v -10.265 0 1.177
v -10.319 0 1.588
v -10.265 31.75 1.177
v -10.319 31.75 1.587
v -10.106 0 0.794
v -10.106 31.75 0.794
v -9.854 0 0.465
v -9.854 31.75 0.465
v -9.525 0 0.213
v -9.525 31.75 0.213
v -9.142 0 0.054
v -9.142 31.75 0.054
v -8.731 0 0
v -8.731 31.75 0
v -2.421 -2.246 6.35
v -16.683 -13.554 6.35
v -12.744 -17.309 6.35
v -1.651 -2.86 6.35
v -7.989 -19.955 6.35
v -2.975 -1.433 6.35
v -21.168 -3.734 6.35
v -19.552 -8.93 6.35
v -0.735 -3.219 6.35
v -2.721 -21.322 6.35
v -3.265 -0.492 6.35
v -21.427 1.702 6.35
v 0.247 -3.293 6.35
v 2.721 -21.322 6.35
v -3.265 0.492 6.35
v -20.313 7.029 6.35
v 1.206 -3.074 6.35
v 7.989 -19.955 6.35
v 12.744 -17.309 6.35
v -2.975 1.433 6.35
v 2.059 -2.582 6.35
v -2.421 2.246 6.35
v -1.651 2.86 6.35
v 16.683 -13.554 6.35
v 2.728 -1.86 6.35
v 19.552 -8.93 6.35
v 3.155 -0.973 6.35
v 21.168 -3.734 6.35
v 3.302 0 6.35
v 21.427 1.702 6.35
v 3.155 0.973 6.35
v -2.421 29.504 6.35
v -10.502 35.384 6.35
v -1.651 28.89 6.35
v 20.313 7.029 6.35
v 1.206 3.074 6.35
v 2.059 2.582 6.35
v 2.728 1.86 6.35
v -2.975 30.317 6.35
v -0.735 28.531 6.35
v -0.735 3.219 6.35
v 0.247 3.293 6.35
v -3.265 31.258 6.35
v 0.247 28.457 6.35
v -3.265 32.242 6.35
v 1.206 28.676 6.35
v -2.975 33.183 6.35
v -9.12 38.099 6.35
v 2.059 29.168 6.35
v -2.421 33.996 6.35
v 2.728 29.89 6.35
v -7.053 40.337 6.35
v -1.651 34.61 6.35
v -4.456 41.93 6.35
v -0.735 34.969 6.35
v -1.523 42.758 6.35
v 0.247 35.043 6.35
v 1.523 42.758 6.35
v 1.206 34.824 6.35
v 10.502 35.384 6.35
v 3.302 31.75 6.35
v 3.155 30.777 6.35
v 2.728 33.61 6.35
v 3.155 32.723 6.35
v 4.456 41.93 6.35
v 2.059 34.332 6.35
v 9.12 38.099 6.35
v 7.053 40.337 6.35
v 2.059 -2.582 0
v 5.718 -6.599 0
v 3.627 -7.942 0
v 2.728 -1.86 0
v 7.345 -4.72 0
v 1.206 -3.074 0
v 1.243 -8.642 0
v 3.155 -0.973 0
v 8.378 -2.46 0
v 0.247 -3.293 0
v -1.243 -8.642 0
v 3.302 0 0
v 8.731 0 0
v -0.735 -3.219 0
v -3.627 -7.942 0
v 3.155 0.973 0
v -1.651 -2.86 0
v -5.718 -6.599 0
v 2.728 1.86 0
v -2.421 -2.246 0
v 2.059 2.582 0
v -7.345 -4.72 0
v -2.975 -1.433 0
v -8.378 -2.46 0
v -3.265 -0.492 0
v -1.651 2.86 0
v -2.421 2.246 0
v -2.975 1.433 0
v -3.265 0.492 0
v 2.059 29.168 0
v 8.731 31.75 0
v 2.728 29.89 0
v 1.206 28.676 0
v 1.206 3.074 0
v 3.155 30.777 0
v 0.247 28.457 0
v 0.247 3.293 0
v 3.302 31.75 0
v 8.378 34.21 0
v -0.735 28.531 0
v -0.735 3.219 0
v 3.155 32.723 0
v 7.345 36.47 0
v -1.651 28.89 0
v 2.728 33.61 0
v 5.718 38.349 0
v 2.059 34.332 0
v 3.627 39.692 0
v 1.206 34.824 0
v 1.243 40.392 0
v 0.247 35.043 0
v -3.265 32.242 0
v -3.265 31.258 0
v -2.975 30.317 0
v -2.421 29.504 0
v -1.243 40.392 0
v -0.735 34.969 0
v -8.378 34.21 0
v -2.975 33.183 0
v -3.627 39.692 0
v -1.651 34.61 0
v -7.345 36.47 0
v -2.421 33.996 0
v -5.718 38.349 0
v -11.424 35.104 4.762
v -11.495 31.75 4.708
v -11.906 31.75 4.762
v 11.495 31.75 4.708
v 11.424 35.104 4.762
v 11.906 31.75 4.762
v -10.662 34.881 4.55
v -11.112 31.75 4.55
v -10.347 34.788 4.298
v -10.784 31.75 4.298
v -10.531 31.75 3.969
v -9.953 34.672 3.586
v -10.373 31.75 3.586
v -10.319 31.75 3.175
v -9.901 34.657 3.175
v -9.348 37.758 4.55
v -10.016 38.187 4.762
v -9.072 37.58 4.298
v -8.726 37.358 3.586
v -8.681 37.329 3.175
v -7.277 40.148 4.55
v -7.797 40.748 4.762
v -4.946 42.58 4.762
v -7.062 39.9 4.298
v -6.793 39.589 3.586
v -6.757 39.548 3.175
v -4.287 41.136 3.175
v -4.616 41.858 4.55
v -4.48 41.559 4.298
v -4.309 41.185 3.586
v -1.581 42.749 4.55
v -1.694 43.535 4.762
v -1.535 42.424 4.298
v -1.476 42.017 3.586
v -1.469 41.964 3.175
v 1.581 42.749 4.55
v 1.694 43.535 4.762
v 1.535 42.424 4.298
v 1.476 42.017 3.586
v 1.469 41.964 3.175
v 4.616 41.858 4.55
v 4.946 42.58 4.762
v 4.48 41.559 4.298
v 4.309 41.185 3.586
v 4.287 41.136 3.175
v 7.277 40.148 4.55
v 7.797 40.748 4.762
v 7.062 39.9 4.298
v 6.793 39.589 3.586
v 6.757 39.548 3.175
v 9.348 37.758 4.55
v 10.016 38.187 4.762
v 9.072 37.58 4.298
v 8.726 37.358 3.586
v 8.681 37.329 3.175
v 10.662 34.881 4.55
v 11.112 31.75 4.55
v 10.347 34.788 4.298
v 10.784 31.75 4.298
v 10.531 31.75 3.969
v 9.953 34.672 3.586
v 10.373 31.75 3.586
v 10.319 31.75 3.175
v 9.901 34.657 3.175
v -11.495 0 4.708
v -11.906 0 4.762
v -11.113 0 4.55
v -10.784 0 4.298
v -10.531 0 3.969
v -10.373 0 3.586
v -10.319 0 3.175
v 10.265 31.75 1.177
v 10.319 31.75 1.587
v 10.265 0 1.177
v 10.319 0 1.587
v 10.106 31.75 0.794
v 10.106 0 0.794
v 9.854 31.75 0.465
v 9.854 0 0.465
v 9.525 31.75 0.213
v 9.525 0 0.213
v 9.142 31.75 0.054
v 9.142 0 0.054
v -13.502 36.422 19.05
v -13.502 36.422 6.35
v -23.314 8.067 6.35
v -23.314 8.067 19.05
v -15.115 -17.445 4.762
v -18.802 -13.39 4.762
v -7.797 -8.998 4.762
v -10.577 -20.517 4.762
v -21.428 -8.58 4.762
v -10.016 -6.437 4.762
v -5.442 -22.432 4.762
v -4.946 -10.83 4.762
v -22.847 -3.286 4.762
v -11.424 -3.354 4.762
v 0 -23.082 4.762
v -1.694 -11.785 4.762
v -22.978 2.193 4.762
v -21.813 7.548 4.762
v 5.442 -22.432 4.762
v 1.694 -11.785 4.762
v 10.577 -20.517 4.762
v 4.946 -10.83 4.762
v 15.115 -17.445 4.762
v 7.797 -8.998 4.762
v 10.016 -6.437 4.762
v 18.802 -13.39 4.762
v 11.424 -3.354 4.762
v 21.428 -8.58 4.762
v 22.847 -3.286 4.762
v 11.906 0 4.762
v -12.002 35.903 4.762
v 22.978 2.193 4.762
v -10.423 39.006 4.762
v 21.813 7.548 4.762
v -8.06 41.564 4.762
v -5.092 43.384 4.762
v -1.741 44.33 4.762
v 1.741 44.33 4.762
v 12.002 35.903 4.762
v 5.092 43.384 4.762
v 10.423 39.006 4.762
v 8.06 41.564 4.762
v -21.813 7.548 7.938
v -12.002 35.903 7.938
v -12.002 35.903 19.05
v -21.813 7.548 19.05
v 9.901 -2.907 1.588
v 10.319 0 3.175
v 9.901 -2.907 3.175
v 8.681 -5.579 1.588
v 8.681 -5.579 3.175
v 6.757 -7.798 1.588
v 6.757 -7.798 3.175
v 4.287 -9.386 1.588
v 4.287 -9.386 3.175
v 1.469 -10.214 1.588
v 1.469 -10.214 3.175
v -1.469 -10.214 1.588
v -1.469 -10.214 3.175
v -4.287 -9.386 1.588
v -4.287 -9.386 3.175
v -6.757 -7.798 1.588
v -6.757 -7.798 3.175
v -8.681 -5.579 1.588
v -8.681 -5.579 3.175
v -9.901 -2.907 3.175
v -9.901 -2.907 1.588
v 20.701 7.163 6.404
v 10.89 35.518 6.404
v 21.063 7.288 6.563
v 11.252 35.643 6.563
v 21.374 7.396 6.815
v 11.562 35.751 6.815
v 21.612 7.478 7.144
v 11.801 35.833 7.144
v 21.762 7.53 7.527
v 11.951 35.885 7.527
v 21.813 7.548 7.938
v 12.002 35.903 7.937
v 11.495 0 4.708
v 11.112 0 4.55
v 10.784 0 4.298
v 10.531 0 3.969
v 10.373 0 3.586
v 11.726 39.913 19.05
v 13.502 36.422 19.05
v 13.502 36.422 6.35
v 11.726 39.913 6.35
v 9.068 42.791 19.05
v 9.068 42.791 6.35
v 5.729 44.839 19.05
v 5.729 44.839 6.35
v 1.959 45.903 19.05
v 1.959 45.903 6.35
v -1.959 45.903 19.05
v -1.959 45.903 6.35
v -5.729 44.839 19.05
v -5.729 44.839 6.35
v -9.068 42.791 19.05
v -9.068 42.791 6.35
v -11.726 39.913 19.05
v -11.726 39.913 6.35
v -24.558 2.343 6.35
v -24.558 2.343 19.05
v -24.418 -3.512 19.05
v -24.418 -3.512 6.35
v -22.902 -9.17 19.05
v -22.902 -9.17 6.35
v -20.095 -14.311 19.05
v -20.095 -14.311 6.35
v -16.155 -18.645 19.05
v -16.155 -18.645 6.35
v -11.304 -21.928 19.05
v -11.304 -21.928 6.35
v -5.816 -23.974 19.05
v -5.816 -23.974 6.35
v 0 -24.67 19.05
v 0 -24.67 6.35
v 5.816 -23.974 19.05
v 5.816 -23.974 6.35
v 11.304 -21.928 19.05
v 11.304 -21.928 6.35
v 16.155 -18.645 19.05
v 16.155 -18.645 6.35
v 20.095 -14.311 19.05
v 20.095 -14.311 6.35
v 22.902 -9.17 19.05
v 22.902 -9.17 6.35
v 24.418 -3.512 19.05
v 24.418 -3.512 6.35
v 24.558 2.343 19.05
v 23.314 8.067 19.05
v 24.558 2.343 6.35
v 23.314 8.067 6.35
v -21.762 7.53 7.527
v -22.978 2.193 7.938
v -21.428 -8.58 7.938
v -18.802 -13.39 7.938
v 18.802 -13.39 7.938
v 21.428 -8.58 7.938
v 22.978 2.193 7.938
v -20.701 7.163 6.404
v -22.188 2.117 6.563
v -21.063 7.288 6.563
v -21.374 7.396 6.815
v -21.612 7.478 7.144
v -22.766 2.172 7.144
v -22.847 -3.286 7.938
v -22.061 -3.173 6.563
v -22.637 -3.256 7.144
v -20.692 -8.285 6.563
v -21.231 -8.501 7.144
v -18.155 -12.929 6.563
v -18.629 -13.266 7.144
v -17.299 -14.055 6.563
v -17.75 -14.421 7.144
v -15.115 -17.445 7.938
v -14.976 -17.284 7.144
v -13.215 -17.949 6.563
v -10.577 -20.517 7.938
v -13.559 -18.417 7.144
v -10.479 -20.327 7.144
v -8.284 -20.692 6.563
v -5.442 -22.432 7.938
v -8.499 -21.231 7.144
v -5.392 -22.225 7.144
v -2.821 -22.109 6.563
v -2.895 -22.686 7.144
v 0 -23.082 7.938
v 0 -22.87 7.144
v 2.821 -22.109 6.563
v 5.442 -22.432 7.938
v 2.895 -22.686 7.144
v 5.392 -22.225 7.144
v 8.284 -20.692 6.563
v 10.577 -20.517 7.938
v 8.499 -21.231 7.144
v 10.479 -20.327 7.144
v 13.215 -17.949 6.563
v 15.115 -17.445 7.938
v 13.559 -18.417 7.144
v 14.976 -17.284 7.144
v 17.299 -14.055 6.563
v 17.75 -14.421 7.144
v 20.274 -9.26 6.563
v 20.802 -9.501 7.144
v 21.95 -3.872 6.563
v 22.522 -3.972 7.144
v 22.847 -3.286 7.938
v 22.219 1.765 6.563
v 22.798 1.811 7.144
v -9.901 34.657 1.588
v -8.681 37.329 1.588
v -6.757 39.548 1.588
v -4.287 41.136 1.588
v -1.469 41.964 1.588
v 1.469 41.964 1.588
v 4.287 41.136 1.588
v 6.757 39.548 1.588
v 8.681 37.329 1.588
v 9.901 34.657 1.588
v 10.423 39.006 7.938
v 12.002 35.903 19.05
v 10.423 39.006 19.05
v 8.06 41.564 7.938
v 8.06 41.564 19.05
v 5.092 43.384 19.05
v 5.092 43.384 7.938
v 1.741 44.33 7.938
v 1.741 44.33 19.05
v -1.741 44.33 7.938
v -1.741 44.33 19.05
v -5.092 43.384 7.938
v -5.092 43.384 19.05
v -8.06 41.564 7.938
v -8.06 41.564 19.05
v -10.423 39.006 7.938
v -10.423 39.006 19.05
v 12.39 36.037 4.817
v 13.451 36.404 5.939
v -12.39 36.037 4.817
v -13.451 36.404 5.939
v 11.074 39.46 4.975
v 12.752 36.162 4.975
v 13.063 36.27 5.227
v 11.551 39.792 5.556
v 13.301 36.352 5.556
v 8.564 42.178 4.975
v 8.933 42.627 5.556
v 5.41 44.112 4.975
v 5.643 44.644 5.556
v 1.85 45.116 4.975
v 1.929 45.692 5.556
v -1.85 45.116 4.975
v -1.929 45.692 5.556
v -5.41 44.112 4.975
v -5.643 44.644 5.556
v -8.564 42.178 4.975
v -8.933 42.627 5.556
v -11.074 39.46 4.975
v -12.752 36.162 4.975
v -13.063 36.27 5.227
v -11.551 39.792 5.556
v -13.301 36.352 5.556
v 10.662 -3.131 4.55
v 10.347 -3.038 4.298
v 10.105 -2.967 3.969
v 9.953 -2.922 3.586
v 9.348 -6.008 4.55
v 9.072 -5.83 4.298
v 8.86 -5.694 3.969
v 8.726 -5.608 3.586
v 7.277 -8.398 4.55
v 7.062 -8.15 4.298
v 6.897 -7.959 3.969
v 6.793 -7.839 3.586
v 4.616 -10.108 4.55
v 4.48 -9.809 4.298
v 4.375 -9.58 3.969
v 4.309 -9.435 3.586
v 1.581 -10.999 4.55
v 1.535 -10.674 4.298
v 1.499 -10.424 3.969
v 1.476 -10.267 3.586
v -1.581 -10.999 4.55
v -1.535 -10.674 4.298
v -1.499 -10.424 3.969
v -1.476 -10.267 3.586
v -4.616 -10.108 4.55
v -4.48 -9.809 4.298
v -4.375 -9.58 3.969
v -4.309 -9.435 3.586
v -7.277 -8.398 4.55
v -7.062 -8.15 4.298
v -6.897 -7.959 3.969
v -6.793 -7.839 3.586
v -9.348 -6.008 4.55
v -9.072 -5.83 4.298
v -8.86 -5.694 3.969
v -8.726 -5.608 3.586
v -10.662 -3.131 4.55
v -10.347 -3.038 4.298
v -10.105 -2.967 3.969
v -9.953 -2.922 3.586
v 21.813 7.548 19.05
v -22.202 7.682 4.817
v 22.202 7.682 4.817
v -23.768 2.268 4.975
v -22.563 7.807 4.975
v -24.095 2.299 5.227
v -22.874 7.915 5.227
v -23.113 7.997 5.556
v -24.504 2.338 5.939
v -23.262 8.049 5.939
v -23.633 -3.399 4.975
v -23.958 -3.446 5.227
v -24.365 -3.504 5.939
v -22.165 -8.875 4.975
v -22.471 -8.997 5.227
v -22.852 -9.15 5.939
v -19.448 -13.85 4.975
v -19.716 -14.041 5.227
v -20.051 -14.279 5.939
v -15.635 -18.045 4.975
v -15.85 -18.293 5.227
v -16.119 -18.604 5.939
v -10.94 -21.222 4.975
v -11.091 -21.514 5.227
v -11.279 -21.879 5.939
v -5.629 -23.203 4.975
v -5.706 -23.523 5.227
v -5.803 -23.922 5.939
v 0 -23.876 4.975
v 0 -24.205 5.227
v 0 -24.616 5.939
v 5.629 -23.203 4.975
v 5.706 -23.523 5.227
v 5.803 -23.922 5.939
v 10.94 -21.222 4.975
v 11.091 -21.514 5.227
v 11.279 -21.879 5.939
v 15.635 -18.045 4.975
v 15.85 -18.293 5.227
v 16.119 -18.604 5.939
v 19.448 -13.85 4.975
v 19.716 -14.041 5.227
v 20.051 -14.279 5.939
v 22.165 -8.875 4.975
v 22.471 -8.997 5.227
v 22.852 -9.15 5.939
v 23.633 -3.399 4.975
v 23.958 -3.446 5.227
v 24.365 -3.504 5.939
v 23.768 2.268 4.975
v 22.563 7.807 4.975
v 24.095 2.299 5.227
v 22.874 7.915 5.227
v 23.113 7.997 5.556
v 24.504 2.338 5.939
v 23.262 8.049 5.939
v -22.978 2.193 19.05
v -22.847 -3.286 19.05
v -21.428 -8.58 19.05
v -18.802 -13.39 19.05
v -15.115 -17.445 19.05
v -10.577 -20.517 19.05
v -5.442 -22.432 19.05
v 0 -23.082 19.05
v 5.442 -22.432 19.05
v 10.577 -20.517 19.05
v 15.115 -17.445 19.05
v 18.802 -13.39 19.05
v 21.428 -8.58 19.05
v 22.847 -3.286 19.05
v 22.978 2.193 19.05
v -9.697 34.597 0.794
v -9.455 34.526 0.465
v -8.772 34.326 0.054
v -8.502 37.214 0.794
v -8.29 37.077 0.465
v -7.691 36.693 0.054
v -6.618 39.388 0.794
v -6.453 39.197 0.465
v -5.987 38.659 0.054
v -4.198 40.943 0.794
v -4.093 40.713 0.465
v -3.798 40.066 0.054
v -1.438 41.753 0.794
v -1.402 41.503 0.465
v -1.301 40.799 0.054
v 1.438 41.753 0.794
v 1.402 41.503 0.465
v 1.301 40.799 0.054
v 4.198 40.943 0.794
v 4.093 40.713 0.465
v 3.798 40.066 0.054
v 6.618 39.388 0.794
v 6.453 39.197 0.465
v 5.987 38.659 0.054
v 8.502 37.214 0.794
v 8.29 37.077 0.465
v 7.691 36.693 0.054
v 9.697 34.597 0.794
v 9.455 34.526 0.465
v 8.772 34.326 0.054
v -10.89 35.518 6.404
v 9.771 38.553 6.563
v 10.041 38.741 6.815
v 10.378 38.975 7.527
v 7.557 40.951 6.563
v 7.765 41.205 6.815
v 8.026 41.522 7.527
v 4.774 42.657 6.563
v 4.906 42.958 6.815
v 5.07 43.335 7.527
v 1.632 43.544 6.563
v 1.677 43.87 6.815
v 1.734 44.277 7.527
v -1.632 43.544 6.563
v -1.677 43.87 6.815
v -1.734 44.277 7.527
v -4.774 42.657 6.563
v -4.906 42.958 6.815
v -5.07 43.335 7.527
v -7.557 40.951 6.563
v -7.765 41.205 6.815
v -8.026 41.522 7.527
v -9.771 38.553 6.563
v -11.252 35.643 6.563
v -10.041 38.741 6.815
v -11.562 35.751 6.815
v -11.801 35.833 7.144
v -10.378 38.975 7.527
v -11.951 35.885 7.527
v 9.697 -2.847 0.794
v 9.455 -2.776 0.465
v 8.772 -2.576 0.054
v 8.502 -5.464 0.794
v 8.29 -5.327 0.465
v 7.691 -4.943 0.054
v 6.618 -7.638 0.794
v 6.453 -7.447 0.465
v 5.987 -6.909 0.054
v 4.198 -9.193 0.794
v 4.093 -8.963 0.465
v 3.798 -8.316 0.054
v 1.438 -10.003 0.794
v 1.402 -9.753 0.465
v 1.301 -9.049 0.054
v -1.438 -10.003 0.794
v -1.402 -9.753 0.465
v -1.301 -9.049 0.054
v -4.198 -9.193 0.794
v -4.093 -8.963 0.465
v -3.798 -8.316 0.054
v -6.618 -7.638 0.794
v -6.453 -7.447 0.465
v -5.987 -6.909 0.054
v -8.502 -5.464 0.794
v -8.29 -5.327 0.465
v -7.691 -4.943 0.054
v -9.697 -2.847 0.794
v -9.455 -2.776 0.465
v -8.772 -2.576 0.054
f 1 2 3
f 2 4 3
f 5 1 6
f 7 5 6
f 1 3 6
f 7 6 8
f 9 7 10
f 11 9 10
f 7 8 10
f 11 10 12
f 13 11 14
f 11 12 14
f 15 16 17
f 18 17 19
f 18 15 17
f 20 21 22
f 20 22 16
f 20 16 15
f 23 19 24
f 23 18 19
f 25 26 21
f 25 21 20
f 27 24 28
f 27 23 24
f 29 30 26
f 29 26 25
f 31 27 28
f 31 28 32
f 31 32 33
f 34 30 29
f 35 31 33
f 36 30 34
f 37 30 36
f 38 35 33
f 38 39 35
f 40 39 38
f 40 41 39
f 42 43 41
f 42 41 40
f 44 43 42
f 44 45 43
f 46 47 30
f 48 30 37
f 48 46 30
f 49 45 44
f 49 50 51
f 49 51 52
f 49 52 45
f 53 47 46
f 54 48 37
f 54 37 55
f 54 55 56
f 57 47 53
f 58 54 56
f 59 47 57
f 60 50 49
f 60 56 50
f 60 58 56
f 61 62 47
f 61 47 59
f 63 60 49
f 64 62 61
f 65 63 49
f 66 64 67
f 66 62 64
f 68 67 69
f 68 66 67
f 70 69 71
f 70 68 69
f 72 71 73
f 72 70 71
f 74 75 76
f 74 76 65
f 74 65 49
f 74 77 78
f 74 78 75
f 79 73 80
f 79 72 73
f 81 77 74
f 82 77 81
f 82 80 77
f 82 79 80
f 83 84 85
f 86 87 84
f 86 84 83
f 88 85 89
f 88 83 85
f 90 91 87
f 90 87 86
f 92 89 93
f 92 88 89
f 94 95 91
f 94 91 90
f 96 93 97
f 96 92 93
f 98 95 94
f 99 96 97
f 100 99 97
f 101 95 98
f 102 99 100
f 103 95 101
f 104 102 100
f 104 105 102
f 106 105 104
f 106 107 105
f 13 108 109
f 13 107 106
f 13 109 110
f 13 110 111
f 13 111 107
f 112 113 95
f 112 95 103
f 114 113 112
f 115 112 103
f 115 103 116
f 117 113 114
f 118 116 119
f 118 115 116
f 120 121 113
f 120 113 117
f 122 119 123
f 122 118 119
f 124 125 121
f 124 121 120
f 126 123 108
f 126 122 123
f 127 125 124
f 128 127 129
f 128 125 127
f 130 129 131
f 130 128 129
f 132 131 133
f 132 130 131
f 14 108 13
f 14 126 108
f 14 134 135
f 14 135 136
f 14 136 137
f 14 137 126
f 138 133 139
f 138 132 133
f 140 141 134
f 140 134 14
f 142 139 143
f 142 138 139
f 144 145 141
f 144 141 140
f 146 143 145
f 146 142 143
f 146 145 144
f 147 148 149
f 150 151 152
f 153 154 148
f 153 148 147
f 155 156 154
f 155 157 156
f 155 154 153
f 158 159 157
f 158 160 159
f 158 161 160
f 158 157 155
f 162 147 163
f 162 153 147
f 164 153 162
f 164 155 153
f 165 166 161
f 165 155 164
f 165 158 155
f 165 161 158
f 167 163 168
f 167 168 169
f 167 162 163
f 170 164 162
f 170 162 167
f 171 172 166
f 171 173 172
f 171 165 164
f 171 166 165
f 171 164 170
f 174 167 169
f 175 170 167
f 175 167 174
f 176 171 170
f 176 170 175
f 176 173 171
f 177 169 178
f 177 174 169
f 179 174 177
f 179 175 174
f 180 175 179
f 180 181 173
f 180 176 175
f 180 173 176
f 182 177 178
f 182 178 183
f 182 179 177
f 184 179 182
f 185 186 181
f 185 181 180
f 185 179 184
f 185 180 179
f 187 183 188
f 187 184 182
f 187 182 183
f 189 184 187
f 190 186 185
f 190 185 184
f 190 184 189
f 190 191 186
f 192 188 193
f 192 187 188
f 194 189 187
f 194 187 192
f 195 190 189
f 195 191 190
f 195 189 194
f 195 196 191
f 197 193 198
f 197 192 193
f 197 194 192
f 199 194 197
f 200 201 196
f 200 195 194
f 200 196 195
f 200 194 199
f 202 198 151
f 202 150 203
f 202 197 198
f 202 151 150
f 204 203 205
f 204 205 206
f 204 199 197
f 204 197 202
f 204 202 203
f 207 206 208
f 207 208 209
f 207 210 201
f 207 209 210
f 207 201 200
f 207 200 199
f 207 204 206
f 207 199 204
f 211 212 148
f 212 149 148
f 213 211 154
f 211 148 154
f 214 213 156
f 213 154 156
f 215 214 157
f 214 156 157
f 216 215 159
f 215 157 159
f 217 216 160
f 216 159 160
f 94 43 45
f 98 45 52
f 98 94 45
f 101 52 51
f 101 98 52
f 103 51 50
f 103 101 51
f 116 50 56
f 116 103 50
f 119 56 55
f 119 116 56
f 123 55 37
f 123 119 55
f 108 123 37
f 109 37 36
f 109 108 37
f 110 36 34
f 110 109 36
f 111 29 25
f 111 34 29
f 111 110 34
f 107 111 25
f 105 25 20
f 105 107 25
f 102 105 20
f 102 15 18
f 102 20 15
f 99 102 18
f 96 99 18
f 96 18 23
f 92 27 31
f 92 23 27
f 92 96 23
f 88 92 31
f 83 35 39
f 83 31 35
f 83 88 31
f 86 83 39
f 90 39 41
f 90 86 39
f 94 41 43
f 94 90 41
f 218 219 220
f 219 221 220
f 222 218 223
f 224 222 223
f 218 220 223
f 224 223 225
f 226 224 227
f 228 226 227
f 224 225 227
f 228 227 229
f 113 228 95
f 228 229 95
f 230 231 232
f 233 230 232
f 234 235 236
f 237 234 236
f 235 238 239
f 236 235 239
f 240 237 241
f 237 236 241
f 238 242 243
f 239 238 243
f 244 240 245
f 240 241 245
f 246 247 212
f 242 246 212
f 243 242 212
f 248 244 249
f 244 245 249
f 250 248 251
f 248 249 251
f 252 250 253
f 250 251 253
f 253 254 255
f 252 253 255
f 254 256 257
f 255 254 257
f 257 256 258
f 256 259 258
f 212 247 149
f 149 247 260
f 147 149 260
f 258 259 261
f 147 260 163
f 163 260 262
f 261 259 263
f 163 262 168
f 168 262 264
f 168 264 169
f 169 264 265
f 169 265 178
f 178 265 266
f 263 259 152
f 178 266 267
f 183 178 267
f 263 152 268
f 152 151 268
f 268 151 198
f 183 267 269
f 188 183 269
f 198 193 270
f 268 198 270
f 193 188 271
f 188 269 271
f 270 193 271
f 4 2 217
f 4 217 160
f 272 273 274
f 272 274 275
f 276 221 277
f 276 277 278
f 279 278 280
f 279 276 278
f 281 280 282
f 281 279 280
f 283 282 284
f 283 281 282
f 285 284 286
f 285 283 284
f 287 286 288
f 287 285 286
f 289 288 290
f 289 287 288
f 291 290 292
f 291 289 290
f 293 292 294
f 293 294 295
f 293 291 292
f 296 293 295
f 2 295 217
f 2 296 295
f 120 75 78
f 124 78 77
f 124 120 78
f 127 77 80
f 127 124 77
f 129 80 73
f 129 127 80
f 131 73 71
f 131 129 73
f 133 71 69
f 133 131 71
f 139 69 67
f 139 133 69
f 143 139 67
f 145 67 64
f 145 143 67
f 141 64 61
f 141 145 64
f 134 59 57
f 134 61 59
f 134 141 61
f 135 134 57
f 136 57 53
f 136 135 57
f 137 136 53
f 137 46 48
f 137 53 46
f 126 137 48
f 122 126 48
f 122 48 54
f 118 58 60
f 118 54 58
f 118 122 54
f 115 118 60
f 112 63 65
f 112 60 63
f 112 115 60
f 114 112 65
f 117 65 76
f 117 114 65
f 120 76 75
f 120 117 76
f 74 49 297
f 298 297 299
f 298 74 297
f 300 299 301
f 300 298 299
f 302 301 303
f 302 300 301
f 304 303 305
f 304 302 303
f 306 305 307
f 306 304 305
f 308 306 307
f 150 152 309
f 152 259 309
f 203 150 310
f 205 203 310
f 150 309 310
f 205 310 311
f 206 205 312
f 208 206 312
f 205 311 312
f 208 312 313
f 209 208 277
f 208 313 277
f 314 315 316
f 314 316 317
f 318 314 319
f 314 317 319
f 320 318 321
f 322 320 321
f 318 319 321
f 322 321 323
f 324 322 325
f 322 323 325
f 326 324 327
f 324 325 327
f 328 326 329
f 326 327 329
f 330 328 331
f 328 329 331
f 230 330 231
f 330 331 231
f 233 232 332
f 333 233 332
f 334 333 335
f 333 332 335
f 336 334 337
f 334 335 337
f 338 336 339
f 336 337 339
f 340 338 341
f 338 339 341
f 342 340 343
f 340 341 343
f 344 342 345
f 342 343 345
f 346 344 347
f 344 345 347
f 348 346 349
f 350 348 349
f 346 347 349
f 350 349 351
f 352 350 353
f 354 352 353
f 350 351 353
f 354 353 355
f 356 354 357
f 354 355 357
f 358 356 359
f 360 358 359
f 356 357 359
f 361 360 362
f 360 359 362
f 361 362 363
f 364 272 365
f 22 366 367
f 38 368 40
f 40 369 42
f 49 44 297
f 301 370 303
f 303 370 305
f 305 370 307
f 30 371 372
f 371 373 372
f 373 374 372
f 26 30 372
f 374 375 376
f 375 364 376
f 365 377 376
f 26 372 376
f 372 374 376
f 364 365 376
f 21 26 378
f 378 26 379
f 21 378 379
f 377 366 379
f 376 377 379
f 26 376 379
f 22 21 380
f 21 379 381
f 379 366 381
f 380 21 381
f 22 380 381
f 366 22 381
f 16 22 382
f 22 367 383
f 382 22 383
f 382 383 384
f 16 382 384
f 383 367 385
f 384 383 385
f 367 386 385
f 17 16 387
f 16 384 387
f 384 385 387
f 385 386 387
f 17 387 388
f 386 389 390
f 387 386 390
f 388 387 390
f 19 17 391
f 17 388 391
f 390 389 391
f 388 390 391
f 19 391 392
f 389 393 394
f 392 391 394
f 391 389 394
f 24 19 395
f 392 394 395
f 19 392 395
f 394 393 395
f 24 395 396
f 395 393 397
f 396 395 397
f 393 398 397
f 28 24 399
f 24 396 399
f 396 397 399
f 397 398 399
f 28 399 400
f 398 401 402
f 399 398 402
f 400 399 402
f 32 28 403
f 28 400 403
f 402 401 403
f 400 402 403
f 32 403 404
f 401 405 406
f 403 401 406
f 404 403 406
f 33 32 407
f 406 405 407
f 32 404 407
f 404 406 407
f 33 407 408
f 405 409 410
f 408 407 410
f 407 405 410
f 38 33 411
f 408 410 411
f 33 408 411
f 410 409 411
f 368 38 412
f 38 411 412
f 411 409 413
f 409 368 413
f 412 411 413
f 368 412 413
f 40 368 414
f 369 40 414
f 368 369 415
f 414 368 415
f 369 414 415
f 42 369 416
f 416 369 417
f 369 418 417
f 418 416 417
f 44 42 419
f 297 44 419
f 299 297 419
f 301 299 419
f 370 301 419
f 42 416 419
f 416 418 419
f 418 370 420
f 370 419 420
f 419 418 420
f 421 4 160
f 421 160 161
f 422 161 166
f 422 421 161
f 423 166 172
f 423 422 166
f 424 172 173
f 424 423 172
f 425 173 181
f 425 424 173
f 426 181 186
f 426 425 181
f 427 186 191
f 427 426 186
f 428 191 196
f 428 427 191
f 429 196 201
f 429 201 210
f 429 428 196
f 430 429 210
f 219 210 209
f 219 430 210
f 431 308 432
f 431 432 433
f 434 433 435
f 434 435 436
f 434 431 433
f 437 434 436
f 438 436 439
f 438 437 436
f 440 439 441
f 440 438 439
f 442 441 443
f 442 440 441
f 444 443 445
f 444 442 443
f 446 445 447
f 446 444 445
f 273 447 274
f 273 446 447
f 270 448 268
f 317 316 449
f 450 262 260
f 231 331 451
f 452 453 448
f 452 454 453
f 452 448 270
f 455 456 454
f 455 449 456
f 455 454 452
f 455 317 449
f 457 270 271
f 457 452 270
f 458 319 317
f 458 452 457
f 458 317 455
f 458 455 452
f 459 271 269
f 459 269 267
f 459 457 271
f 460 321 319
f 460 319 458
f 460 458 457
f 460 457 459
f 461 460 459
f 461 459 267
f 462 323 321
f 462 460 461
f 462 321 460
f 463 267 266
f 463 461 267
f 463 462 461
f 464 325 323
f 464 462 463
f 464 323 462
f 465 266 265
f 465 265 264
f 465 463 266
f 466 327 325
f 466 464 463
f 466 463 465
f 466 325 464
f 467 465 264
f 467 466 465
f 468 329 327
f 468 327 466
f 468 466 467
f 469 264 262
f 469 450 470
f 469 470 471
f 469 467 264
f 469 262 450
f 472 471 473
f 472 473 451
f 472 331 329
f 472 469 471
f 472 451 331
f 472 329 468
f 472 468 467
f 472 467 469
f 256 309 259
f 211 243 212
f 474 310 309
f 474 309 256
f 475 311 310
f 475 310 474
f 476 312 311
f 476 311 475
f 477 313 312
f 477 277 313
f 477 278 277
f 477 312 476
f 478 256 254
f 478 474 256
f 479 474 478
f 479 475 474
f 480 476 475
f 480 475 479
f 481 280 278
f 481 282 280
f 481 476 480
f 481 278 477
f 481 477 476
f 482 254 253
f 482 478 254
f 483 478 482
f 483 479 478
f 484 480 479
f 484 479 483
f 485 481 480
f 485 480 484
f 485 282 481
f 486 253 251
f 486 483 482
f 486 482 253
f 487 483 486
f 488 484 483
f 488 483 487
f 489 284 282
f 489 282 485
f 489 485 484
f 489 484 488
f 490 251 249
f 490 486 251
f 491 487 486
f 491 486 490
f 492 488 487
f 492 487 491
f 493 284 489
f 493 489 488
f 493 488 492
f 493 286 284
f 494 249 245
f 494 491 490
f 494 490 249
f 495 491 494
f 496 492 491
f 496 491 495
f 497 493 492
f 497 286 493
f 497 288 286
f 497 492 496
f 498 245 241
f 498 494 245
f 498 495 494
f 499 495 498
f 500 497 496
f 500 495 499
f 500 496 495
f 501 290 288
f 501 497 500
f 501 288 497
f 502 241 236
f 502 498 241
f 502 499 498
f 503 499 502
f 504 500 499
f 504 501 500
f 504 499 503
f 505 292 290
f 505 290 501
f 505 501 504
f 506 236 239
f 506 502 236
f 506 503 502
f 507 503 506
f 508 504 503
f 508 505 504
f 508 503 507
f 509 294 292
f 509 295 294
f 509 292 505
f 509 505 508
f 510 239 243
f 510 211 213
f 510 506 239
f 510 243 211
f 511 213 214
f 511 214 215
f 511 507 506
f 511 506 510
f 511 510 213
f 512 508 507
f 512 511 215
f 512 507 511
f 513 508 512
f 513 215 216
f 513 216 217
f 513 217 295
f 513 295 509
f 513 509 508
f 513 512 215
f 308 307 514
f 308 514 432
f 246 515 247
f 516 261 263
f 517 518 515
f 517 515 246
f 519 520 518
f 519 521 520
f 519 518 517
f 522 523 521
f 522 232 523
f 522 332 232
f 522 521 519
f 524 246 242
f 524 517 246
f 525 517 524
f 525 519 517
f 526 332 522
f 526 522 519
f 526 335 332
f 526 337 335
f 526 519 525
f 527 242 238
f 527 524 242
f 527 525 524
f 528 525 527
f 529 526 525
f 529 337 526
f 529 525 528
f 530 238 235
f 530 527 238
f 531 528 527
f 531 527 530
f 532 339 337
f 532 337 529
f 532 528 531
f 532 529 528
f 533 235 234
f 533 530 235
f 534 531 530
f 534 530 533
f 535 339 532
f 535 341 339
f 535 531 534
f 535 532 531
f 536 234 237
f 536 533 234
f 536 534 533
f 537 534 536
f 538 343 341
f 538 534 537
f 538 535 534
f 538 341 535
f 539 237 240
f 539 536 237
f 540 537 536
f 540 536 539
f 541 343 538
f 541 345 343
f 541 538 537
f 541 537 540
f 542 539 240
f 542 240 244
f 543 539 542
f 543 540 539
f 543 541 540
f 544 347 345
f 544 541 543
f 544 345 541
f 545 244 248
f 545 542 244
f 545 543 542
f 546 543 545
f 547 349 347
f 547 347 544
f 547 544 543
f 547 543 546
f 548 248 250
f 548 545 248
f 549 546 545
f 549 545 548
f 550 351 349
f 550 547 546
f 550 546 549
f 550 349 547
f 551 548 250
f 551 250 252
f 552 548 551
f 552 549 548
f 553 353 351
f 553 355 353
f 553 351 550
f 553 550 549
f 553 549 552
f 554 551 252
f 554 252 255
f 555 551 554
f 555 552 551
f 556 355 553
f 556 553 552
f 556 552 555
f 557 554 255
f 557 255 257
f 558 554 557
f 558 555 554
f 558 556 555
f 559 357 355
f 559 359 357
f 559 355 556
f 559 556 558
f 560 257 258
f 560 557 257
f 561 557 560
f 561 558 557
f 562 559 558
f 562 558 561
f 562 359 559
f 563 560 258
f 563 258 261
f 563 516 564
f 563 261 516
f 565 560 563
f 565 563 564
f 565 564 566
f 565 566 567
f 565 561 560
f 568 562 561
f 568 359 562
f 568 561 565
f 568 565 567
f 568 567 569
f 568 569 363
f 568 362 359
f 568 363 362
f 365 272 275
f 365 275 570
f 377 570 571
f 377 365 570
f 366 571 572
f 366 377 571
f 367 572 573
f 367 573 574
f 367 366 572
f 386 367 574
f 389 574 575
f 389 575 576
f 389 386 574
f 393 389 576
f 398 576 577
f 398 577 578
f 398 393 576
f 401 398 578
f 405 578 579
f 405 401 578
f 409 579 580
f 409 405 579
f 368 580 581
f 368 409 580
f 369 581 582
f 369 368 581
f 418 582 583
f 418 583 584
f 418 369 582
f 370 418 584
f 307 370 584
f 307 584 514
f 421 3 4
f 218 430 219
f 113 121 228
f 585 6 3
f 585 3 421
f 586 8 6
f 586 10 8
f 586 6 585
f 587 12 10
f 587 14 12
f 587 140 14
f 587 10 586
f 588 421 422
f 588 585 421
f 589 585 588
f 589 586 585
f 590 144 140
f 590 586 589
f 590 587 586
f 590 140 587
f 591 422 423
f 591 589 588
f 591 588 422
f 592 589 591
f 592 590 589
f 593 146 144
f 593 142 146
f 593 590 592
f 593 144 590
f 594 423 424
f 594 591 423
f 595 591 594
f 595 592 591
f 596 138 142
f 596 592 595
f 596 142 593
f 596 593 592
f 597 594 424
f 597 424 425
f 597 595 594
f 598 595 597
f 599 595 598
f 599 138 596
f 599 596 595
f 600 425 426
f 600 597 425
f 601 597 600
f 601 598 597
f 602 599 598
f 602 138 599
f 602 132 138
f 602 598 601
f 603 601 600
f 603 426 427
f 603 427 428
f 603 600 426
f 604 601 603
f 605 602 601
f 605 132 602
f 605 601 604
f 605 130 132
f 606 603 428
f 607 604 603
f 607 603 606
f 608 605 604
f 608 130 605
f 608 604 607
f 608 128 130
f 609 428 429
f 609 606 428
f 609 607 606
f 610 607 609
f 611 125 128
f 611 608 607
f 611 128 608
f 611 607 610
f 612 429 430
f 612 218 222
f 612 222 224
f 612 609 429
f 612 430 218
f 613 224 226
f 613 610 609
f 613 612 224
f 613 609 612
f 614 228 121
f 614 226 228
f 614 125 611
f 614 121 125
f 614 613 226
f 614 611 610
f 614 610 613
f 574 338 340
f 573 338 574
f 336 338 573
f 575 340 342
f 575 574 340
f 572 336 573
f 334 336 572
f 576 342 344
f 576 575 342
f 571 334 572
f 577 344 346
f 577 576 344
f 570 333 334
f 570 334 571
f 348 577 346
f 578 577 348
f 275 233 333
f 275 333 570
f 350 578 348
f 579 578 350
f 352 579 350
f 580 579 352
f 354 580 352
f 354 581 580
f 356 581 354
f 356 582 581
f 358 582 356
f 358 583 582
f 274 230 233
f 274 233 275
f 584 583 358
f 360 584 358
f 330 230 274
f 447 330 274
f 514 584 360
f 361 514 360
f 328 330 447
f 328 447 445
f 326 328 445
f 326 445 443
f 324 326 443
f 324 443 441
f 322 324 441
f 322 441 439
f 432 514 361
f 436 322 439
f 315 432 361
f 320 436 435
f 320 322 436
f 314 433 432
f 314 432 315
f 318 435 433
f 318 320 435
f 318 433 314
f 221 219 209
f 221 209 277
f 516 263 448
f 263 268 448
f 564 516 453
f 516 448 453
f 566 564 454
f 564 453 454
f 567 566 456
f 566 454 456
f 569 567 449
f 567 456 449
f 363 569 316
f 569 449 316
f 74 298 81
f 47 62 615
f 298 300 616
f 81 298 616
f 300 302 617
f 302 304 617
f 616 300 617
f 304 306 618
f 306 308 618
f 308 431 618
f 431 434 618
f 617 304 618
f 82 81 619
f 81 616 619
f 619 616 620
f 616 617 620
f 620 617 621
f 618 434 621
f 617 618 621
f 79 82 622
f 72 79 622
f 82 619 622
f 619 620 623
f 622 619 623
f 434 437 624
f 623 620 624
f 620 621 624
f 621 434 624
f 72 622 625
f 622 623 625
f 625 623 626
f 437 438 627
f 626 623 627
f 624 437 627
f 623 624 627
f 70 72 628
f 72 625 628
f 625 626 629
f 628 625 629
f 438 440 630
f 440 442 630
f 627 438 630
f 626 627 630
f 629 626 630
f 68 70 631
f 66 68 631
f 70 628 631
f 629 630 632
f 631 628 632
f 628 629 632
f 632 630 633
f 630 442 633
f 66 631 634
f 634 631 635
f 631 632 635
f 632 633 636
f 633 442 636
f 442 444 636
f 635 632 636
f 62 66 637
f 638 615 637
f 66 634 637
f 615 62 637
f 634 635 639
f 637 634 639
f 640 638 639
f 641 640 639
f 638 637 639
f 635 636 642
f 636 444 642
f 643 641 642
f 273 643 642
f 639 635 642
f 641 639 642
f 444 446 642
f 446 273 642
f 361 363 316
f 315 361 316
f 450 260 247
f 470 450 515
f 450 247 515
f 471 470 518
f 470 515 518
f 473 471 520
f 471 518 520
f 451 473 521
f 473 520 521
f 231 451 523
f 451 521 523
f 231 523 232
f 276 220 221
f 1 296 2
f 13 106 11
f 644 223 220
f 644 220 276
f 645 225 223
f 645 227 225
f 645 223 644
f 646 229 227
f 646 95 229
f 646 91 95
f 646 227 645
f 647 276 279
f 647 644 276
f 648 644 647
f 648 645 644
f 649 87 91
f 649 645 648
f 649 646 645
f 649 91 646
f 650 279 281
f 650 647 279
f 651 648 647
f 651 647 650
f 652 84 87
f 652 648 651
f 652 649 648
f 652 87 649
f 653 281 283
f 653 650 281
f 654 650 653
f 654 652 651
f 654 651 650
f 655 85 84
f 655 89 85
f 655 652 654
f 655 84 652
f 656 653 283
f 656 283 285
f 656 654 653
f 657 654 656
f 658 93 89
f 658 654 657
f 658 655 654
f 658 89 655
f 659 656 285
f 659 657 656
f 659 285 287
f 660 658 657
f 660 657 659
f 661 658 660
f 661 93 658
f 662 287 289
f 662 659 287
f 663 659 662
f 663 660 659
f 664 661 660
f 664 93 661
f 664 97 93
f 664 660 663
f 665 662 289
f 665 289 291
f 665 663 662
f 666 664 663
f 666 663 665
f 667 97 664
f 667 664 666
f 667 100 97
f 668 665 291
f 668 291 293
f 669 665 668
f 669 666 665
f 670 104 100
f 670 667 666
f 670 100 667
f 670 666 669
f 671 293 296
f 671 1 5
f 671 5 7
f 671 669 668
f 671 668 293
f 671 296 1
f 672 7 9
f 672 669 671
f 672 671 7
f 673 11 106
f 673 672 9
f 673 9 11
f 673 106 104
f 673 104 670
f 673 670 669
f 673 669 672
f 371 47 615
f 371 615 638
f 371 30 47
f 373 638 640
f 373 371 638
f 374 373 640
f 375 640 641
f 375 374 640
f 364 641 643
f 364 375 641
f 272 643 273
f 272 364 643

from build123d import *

# Parameters (mm, degrees)
SKETCH1_R           = 3.302
BOSS_EXTRUDE1_DEPTH = 6.35
BOSS_EXTRUDE2_START = -6.35
SKETCH2_R           = 3.302
BOSS_EXTRUDE2_DEPTH = 1.5875
BOSS_EXTRUDE3_DEPTH = 12.7
FILLET1_R           = 1.5875
FILLET2_R           = 1.5875


with BuildPart() as part:
    # Sketch1 → Boss-Extrude1 (new body)
    with BuildSketch(Plane.XY):
        with BuildLine():
            Line((10.31875, 31.75), (10.31875, 0))
            ThreePointArc((10.31875, 0), (0, -10.31875), (-10.31875, 0))
            Line((-10.31875, 0), (-10.31875, 31.75))
            ThreePointArc((-10.31875, 31.75), (0, 42.06875), (10.31875, 31.75))
        make_face()
        Circle(SKETCH1_R, mode=Mode.SUBTRACT)
        with Locations((0, 31.75)):
            Circle(SKETCH1_R, mode=Mode.SUBTRACT)
    extrude(amount=BOSS_EXTRUDE1_DEPTH)

    # Sketch2 → Boss-Extrude2 (add)
    with BuildSketch(Plane(origin=(0, 0, 0), x_dir=(-1, 0, 0), z_dir=(0, 0, -1)).offset(BOSS_EXTRUDE2_START)):
        with BuildLine():
            Line((-23.31351417, 8.06700825), (-13.502035234, 36.4220125))
            ThreePointArc((-13.502035234, 36.4220125), (0, 46.0375), (13.502035234, 36.4220125))
            Line((13.502035234, 36.4220125), (23.31351417, 8.06700825))
            ThreePointArc((23.31351417, 8.06700825), (0, -24.66975), (-23.31351417, 8.06700825))
        make_face()
        Circle(SKETCH2_R, mode=Mode.SUBTRACT)
        with Locations((0, 31.75)):
            Circle(SKETCH2_R, mode=Mode.SUBTRACT)
    extrude(amount=BOSS_EXTRUDE2_DEPTH)

    # Sketch3 → Boss-Extrude3 (add)
    with BuildSketch(Plane.XY.offset(6.35)):
        with BuildLine():
            Line((-13.502035234, 36.4220125), (-23.31351417, 8.06700825))
            ThreePointArc((-23.31351417, 8.06700825), (0, -24.66975), (23.31351417, 8.06700825))
            Line((23.31351417, 8.06700825), (13.502035234, 36.4220125))
            ThreePointArc((13.502035234, 36.4220125), (0, 46.0375), (-13.502035234, 36.4220125))
        make_face()
        with BuildLine():
            Line((21.813288033, 7.54789575), (12.001809097, 35.9029))
            ThreePointArc((12.001809097, 35.9029), (0, 44.45), (-12.001809097, 35.9029))
            Line((-12.001809097, 35.9029), (-21.813288033, 7.54789575))
            ThreePointArc((-21.813288033, 7.54789575), (0, -23.08225), (21.813288033, 7.54789575))
        make_face(mode=Mode.SUBTRACT)
    extrude(amount=BOSS_EXTRUDE3_DEPTH)

    # Fillet1
    fillet1_edges = [part.edges().sort_by_distance(p)[0] for p in [
        (10.31875, 15.875, 4.7625),
        (0, 42.06875, 4.7625),
        (-10.31875, 15.875, 4.7625),
        (0, -10.31875, 4.7625),
        (0, 46.0375, 4.7625),
        (18.407774702, 22.244510375, 4.7625),
        (0, -24.66975, 4.7625),
        (-18.407774702, 22.244510375, 4.7625),
        (0, -23.08225, 6.35),
        (16.907548565, 21.725397875, 6.35),
        (0, 44.45, 6.35),
        (-16.907548565, 21.725397875, 6.35),
    ]]
    fillet(fillet1_edges, radius=FILLET1_R)

    # Fillet2
    fillet2_edges = [part.edges().sort_by_distance(p)[0] for p in [
        (10.31875, 15.875, 0),
        (0, -10.31875, 0),
        (-10.31875, 15.875, 0),
        (0, 42.06875, 0),
    ]]
    fillet(fillet2_edges, radius=FILLET2_R)


solid = part.part
